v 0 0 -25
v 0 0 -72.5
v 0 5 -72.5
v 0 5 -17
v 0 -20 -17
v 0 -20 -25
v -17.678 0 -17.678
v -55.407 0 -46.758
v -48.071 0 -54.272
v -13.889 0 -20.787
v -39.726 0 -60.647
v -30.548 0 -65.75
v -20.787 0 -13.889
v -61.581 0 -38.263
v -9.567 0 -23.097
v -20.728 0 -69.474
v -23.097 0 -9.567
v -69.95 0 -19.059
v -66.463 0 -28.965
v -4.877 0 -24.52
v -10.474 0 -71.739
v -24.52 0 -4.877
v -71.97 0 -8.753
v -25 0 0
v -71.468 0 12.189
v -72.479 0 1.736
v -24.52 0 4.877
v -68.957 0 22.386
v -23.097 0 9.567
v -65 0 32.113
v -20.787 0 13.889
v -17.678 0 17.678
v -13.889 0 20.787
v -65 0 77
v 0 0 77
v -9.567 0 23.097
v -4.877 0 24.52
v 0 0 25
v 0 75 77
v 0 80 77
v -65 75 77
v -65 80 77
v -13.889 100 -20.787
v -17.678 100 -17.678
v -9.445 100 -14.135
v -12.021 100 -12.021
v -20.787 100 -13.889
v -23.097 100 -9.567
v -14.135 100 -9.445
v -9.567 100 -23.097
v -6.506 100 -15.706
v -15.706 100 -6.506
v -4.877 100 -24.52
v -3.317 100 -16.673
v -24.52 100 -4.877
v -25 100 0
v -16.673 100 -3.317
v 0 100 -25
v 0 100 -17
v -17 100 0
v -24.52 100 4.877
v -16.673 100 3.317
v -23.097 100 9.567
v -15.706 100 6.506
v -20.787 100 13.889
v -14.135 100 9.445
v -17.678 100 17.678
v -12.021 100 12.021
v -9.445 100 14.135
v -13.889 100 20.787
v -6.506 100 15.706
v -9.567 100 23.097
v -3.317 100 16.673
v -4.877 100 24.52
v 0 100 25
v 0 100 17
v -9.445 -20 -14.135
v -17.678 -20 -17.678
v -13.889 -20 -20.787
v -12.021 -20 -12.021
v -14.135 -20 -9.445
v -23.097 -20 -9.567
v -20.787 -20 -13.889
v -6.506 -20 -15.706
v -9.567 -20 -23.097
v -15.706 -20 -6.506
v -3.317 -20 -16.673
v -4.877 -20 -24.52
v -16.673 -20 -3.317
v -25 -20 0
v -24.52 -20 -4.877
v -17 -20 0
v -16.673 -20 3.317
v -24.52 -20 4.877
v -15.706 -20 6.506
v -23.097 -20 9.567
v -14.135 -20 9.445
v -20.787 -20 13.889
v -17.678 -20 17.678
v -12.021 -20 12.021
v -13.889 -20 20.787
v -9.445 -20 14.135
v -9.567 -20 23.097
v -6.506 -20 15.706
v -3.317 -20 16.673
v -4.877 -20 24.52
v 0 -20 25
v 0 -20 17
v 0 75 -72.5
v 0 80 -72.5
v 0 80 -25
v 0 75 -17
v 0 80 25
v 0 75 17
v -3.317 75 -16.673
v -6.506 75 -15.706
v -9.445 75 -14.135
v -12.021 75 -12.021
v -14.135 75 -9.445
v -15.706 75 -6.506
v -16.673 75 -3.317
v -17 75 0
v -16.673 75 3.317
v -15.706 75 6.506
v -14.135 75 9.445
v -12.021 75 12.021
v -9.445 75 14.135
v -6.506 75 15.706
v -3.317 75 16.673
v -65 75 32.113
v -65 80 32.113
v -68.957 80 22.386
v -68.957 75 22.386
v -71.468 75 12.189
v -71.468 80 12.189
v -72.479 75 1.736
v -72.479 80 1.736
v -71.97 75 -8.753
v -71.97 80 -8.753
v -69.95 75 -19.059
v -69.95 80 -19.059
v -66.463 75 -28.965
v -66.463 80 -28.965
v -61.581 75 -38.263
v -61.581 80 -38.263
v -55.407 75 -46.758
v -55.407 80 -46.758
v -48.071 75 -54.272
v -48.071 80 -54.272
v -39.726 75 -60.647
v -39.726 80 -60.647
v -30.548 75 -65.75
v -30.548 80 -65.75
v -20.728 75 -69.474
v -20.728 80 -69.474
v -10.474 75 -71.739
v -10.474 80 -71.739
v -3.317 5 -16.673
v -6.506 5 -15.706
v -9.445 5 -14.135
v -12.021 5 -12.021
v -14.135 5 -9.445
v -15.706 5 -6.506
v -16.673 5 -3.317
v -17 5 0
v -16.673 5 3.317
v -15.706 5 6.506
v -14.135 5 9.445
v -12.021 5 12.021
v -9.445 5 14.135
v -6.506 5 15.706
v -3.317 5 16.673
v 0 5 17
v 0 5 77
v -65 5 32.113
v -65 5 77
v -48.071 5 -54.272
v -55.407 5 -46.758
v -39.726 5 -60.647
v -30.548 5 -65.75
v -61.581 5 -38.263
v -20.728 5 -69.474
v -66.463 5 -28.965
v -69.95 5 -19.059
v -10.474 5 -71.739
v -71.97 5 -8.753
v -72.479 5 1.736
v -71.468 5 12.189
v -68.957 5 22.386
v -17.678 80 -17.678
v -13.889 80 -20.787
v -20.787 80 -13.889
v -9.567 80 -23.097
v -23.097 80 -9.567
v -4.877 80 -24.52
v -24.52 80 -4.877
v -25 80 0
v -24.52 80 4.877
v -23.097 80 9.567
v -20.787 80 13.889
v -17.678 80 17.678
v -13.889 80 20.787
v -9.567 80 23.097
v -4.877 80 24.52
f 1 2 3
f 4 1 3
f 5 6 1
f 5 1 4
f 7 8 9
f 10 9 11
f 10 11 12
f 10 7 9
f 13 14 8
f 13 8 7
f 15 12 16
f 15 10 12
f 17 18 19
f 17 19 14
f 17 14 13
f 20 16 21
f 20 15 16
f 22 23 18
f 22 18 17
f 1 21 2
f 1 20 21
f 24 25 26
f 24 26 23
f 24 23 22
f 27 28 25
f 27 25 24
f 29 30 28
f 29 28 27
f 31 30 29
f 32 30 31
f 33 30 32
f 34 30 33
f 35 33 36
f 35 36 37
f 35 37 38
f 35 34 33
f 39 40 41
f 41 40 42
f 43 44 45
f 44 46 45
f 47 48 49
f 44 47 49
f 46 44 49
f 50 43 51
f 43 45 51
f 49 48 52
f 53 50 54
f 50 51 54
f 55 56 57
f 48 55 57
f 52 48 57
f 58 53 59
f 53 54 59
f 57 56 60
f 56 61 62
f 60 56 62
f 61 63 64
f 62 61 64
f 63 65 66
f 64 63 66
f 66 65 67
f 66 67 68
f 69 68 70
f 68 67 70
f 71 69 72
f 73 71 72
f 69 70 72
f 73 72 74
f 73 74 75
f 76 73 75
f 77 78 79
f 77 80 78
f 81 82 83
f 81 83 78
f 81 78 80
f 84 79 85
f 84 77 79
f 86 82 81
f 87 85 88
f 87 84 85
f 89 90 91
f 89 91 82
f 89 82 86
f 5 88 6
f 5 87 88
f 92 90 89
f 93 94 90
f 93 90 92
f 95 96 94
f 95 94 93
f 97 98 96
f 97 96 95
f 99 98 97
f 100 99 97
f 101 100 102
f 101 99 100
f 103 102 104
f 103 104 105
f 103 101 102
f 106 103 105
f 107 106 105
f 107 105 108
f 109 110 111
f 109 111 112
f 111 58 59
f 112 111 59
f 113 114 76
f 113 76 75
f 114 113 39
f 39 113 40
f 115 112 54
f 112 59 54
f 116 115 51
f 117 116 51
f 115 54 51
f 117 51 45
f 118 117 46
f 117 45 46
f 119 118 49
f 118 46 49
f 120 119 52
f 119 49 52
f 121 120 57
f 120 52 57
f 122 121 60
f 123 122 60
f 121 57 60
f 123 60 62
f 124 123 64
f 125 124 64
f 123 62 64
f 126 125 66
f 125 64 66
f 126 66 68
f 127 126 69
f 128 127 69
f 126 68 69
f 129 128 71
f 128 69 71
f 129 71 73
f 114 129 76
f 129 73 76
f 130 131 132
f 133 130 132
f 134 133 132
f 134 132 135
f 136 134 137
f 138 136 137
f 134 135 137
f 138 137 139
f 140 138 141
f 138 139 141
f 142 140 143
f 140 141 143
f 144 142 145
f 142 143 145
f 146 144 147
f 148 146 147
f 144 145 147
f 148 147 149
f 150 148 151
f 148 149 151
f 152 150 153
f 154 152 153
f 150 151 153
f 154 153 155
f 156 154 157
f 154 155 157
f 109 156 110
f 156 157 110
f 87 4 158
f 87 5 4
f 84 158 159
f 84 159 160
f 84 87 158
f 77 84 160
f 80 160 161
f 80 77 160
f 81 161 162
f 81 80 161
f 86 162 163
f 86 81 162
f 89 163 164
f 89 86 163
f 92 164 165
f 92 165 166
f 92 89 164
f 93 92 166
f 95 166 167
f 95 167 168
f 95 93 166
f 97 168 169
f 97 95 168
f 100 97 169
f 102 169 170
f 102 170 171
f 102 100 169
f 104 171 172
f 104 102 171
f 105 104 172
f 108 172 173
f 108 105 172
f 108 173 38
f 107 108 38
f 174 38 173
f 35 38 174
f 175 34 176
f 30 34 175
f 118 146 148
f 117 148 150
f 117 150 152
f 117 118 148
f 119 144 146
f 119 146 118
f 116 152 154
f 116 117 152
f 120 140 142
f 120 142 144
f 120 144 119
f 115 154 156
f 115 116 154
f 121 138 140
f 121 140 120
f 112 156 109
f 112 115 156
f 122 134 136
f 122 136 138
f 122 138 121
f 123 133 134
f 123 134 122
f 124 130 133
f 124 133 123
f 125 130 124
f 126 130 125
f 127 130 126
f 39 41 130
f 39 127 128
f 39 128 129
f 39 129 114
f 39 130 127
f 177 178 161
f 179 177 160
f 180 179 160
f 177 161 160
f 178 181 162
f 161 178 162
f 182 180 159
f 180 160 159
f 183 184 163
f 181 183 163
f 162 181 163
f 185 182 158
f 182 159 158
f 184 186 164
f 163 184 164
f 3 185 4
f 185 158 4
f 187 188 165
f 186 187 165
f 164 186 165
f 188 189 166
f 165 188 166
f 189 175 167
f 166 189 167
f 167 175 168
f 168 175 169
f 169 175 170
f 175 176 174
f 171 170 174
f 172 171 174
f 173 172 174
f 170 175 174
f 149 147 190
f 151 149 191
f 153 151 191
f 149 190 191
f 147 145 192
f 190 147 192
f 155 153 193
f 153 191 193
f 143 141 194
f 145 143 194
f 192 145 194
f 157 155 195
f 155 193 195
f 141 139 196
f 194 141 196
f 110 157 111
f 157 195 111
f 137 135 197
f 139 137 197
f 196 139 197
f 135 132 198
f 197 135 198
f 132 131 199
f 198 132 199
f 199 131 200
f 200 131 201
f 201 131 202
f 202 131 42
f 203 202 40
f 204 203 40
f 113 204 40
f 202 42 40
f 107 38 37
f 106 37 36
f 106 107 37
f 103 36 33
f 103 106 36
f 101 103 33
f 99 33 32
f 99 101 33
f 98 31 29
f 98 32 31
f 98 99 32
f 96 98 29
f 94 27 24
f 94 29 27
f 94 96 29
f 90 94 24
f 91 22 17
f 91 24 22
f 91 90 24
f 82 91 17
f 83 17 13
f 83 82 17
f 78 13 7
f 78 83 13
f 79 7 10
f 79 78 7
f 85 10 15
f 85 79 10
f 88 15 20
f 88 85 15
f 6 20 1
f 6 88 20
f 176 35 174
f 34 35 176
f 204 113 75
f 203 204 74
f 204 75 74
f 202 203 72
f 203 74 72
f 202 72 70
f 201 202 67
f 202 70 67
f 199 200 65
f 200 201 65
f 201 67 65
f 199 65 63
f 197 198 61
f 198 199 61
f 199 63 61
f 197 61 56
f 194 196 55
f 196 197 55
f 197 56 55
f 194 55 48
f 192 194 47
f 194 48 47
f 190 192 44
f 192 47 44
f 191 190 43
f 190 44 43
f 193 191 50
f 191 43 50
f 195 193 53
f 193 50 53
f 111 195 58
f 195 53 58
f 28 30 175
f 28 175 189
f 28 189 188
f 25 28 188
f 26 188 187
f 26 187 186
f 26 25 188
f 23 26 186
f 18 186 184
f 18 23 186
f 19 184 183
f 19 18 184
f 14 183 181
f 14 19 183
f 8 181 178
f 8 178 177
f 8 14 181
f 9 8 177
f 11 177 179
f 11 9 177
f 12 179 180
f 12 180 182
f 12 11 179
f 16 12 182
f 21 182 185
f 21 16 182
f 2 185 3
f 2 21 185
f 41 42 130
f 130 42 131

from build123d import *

# Parameters (mm, degrees)
F1_DEPTH      = 20
F1_DEPTH_BACK = 5
F3_DEPTH      = 5


with BuildPart() as f1:
    # F0 (on Front) → F1 (new body, two sides)
    with BuildSketch(Plane.XZ) as f1_sk:
        with BuildLine():
            Line((0, 17), (0, 25))
            ThreePointArc((0, 25), (-25, 0), (0, -25))
            Line((0, -25), (0, -17))
            ThreePointArc((0, -17), (-17, 0), (0, 17))
        make_face()
    extrude(amount=F1_DEPTH)
    extrude(f1_sk.sketch, amount=-F1_DEPTH_BACK)

    # F2 (on Front) → F3 (join)
    with BuildSketch(Plane.XZ):
        with BuildLine():
            Line((-65, 77), (-65, 32.113081))
            ThreePointArc((-65, 32.113081), (-61.581038, -38.26259), (0, -72.5))
            Line((0, -72.5), (0, -25))
            ThreePointArc((0, -25), (-25, 0), (0, 25))
            Line((0, 25), (0, 77))
            Line((0, 77), (-65, 77))
        make_face()
    extrude(amount=-F3_DEPTH)


with BuildPart() as f5_1:
    # F5: instance of F1
    add(f1.part.mirror(Plane.XZ.offset(-40)))


solid = Compound([f1.part, f5_1.part])
